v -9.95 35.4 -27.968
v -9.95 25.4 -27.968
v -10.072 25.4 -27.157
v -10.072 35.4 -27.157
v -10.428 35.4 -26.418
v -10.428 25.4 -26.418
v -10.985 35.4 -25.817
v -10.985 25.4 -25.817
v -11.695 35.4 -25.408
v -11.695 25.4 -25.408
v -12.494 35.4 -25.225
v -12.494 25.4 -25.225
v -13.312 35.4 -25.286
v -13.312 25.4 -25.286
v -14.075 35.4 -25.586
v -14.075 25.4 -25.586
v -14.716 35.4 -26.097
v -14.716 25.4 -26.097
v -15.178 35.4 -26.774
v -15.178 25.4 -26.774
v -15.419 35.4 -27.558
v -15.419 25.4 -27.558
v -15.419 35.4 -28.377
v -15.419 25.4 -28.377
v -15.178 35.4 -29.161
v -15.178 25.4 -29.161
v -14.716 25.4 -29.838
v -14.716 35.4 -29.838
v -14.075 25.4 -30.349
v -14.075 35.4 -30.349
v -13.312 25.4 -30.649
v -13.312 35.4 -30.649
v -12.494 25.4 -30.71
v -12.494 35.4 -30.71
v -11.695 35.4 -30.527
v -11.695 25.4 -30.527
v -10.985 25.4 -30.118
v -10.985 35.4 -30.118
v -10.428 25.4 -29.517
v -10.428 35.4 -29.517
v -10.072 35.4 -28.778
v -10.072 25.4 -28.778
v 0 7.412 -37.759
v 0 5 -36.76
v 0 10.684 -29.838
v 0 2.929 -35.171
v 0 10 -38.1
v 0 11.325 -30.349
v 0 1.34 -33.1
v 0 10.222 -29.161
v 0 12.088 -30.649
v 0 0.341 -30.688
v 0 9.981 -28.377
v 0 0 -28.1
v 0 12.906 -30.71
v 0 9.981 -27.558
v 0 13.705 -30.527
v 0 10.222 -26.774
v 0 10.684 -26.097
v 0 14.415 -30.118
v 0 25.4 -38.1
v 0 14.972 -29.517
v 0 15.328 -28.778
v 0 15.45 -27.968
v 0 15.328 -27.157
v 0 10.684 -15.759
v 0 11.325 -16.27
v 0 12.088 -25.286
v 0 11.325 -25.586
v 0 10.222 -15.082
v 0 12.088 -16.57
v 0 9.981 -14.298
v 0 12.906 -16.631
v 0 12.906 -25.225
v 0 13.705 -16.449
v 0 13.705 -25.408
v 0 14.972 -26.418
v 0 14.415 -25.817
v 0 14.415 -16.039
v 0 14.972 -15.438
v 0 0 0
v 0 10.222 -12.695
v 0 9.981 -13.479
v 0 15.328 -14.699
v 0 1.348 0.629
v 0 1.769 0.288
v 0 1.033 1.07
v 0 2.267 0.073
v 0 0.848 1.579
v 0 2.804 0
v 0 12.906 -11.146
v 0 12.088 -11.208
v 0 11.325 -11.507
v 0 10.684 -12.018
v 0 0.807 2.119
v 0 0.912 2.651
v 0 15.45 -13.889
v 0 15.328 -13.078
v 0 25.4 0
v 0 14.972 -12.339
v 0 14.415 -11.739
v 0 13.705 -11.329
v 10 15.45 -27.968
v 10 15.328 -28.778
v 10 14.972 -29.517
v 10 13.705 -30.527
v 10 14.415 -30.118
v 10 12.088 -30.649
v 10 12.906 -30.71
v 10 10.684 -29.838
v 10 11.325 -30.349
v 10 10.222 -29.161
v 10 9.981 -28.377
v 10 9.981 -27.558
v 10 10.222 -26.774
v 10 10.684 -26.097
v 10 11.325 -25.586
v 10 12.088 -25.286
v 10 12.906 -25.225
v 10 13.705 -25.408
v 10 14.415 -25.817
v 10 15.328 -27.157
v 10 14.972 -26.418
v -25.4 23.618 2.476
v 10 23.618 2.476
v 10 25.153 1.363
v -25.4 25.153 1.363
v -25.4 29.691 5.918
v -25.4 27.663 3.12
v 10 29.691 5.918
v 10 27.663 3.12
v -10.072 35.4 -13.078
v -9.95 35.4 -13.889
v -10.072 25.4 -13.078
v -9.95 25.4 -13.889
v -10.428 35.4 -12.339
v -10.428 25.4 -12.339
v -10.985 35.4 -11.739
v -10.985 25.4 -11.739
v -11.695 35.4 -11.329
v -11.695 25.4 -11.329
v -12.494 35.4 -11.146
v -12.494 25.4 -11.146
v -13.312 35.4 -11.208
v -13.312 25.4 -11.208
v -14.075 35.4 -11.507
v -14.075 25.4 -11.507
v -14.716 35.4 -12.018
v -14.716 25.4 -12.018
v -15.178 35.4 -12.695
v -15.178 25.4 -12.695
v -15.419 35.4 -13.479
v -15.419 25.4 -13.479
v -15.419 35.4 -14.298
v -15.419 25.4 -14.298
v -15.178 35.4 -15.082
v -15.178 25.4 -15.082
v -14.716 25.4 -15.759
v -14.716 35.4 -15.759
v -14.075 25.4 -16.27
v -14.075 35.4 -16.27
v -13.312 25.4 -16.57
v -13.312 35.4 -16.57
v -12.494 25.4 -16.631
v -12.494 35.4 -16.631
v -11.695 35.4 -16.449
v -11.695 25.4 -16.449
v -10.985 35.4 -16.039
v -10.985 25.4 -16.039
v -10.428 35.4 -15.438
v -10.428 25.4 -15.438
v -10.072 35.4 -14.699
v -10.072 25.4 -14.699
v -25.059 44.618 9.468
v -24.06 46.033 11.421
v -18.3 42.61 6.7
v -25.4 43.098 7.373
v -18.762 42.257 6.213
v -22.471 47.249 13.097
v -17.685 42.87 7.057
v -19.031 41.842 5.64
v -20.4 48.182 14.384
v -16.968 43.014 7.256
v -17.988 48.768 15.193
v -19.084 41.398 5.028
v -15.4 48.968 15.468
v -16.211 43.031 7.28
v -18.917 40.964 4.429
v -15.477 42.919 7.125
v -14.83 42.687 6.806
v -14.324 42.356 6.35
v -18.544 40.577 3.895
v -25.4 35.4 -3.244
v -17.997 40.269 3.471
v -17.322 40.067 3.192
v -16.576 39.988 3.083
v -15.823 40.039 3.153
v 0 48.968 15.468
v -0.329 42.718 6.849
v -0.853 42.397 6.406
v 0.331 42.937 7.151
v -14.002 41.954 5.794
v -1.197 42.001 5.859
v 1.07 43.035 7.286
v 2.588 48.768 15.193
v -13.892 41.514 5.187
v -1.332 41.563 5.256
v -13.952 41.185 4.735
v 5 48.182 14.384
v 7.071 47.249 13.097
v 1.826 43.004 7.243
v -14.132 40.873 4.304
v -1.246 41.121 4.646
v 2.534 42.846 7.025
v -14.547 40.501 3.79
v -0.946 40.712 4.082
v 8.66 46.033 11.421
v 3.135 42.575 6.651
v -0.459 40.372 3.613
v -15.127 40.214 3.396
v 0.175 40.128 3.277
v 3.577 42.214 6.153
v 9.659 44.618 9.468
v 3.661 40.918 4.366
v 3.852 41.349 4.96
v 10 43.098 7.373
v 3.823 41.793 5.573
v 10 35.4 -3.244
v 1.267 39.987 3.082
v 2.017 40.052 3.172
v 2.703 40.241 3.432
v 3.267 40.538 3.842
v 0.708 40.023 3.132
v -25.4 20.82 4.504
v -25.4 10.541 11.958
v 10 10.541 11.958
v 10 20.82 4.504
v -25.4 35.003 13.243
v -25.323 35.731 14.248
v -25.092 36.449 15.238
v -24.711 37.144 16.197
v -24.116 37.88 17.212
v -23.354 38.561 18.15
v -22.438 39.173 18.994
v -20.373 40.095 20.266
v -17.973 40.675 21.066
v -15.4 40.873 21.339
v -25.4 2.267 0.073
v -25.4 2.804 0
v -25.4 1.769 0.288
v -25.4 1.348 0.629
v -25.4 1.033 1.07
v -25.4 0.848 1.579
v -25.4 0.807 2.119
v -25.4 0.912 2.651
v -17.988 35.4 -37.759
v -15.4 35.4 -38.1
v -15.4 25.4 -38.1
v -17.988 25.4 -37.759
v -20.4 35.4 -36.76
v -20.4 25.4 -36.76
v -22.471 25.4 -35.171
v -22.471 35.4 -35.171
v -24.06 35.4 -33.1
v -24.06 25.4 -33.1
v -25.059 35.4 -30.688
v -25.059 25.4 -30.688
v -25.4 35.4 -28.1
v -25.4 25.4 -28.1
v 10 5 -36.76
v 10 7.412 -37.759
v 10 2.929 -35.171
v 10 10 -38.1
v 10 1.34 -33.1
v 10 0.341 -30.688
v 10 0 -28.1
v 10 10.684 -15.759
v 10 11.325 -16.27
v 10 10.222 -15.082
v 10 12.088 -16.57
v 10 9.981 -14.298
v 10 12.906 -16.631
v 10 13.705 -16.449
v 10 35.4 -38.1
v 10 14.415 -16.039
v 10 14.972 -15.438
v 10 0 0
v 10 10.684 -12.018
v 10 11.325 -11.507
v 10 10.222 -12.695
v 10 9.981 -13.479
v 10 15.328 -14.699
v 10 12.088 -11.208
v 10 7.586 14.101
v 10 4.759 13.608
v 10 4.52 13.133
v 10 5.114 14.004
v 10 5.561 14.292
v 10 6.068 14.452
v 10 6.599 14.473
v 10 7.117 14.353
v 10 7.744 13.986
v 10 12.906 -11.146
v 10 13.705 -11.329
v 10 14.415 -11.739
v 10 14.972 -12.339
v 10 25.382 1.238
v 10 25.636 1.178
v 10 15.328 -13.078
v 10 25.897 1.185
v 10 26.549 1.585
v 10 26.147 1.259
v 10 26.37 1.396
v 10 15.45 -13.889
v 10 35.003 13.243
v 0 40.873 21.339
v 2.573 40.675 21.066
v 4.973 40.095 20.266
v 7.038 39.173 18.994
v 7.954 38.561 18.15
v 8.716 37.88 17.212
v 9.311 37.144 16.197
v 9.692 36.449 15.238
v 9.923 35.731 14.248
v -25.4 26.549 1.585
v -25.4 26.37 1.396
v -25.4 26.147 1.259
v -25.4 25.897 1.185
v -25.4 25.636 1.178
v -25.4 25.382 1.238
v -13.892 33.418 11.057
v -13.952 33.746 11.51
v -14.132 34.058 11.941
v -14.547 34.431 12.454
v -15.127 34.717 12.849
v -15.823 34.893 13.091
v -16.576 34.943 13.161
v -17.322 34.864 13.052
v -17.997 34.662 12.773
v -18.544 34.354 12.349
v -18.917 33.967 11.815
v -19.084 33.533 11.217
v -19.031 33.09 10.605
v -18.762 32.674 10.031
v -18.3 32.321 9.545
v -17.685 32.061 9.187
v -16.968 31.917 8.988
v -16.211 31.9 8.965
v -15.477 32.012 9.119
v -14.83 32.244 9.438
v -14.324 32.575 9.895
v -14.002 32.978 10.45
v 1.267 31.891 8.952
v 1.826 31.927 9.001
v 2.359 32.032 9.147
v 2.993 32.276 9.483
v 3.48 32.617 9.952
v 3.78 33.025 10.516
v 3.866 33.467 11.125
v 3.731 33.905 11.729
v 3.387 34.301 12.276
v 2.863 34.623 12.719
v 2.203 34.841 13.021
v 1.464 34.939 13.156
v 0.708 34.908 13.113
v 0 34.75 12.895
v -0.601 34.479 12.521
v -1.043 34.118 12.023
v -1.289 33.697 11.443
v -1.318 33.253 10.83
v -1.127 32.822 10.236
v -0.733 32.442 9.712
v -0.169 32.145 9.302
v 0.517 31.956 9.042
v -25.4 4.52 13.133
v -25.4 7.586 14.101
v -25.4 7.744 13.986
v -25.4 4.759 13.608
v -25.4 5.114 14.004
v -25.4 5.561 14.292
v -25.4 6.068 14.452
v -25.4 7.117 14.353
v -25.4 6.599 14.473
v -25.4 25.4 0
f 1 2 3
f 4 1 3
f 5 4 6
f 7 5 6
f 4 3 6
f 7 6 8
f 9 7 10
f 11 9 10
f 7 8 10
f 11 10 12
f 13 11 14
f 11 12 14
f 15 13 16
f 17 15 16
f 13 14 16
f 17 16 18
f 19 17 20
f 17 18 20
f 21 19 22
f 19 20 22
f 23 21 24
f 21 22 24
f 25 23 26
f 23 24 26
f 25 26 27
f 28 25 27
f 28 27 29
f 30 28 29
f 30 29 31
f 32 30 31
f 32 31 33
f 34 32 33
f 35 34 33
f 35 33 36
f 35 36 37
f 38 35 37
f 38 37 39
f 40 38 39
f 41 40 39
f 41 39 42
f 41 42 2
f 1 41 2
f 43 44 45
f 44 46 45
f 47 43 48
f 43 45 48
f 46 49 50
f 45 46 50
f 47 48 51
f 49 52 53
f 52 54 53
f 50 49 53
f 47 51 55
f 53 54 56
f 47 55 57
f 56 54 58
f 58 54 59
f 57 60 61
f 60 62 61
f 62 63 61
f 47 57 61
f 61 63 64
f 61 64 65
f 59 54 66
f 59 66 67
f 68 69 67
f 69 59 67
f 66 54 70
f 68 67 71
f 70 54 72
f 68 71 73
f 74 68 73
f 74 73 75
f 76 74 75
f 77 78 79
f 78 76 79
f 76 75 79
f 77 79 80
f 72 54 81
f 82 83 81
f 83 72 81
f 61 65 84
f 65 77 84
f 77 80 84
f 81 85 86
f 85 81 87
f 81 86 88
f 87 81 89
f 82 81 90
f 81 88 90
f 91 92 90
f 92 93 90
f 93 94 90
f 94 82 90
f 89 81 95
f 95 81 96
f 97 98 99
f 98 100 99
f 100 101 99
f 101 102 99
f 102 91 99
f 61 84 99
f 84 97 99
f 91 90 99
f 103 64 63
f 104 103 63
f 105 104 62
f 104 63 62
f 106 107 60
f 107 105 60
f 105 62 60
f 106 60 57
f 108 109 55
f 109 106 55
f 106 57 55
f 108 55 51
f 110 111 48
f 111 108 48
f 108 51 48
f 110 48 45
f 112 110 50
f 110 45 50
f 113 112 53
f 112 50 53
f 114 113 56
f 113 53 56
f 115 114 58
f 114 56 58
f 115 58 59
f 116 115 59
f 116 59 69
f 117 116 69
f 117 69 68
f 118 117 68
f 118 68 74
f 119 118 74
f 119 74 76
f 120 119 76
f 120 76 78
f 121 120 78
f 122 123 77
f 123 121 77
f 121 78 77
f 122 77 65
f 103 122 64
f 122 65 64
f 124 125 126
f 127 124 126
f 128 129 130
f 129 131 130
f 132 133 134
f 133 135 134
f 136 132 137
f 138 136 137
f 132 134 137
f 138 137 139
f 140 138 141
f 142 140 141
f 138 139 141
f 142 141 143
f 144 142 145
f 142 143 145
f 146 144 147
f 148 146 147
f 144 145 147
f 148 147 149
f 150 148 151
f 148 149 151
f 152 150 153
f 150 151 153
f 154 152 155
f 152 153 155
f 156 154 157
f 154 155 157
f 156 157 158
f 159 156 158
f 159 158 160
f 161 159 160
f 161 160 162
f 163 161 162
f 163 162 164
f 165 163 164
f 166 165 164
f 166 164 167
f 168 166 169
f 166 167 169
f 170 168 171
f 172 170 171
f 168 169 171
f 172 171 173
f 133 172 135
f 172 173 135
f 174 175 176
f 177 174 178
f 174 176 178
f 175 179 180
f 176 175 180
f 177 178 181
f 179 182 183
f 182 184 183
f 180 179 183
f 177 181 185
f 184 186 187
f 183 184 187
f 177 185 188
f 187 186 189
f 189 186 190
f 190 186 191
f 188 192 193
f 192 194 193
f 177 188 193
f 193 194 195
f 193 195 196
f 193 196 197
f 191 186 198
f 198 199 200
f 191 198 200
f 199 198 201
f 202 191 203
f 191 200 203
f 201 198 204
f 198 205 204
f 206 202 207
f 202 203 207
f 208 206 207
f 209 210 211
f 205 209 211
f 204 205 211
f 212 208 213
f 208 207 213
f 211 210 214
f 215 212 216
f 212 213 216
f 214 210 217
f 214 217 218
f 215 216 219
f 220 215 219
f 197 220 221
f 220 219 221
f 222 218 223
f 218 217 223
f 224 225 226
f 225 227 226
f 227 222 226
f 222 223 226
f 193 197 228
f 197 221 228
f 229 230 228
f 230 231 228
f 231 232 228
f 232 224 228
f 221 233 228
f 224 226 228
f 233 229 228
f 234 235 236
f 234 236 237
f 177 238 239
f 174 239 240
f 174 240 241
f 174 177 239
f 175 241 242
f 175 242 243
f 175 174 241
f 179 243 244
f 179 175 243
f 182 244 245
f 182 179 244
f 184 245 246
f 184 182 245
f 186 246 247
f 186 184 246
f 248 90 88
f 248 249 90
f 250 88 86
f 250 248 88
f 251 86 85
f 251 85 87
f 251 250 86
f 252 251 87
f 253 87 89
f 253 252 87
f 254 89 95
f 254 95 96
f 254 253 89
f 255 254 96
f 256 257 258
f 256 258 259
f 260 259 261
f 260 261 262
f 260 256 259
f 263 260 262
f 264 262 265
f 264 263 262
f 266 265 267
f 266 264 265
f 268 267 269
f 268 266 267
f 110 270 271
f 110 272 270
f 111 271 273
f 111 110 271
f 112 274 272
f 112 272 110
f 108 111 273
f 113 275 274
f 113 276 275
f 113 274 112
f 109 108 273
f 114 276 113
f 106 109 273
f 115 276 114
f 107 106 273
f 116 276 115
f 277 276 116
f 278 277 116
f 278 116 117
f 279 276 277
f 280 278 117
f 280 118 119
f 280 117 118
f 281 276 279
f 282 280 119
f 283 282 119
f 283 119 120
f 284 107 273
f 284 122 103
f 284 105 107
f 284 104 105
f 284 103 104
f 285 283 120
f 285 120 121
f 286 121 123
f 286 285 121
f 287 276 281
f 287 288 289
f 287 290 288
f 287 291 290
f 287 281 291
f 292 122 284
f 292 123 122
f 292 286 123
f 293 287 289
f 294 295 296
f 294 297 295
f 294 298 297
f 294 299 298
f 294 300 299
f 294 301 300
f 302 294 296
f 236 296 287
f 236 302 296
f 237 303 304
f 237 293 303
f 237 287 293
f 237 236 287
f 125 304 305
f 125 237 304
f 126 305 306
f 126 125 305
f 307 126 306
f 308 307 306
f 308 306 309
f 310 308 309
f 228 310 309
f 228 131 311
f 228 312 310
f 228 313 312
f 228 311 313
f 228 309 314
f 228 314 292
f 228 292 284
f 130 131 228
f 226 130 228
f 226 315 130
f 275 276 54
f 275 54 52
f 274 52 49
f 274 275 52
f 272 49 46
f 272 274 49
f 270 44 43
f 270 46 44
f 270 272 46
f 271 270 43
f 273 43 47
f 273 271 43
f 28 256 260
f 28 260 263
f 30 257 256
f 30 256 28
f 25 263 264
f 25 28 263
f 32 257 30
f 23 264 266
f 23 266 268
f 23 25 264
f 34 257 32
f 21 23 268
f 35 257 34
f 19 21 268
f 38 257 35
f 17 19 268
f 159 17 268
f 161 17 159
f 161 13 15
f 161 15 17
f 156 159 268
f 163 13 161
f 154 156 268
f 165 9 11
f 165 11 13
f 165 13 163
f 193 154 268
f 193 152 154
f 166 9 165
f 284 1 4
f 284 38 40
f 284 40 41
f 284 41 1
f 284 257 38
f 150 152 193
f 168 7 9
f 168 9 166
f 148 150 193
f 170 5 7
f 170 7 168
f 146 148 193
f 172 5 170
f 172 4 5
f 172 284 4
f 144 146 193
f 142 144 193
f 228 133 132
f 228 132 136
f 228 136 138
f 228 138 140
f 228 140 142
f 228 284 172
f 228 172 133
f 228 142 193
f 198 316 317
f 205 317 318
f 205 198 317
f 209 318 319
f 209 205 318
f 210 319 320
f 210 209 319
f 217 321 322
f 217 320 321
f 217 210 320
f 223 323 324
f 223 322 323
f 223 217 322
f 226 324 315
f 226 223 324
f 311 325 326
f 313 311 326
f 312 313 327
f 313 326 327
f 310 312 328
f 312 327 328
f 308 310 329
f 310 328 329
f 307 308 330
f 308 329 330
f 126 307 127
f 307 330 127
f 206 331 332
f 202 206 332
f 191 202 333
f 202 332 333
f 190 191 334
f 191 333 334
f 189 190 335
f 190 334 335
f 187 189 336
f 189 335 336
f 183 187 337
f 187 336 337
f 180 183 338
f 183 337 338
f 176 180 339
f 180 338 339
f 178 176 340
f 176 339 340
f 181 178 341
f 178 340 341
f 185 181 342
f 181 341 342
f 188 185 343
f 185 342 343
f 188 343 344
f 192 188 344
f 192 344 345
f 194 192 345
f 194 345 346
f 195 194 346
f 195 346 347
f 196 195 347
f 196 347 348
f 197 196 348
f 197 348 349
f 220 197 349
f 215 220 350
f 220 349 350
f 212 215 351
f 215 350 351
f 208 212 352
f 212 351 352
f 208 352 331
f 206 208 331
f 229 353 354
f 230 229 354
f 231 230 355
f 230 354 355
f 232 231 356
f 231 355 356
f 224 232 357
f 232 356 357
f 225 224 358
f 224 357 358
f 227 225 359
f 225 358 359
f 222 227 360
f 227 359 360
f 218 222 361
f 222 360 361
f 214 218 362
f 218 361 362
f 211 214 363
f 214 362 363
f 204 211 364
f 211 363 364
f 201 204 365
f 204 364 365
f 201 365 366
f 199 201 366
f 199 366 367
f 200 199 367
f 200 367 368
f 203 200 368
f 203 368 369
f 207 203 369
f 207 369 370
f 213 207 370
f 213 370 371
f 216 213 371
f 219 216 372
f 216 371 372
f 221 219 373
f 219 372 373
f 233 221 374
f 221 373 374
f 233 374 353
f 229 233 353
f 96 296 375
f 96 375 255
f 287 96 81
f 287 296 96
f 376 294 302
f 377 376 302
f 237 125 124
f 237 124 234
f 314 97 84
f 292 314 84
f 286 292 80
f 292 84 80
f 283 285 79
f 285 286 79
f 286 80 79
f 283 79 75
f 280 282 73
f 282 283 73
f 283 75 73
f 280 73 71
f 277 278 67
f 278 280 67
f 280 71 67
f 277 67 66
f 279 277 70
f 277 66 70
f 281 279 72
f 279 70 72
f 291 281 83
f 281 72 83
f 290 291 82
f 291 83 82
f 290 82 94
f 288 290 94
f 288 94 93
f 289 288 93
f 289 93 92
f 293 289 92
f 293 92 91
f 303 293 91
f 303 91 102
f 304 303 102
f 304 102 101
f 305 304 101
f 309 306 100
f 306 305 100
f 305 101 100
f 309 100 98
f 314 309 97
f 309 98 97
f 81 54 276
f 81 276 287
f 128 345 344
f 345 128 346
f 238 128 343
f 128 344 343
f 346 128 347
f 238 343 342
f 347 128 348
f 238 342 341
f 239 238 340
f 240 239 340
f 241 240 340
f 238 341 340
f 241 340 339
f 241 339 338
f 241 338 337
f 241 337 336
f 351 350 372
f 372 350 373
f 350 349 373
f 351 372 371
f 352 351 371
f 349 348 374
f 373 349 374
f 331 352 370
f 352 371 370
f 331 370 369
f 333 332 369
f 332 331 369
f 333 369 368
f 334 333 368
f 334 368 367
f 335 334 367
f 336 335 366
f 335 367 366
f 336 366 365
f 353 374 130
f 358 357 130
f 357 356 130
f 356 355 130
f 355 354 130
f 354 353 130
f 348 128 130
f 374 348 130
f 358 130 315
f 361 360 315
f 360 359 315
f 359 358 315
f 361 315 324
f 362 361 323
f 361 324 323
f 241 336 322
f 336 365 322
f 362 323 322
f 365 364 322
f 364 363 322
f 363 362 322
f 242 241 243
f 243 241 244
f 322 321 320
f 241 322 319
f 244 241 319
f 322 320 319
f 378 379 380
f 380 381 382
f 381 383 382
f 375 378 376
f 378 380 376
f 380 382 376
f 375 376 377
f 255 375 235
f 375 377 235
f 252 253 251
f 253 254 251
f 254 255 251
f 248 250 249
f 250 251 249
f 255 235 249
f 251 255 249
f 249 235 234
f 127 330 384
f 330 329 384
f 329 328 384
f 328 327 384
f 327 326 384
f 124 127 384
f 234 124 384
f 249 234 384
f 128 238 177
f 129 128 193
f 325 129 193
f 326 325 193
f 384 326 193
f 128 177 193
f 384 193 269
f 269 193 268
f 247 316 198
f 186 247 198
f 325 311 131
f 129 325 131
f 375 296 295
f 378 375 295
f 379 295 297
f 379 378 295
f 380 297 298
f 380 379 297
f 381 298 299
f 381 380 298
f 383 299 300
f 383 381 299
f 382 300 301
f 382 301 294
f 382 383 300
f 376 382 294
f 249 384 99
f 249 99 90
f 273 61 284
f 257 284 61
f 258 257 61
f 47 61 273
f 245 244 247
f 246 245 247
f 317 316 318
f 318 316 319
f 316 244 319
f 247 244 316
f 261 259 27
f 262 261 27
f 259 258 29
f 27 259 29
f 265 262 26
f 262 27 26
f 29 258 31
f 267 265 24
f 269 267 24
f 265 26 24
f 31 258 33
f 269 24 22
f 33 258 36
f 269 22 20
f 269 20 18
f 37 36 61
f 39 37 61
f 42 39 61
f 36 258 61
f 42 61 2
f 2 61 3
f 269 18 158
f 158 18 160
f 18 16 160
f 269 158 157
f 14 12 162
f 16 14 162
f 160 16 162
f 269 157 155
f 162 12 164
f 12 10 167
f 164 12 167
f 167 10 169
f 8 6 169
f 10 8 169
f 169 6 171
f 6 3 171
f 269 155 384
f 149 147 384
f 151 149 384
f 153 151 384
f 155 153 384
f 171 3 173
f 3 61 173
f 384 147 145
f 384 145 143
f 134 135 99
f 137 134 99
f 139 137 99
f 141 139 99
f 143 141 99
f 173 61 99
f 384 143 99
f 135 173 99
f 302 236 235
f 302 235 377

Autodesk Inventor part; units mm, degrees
ref_plane "YZ Plane" through (0, 0, 0) normal (1, 0, 0) x (0, 1, 0)
ref_plane "XZ Plane" through (0, 0, 0) normal (0, 1, 0) x (-1, 0, 0)
ref_plane "XY Plane" through (0, 0, 0) normal (0, 0, 1) x (1, 0, 0)
sketch "Sketch1" plane through (0, 0, 0) normal (1, 0, 0) x (0, 1, 0)
  line L0 (0, 0) -> (25.4, 0)
  line L1 (25.4, 0) -> (25.4, -38.1)
  line L2 (25.4, -38.1) -> (0, -38.1)
  line L3 (0, -38.1) -> (0, 0)
  circle A0 centre (12.7, -27.9675) radius 2.75
  circle A1 centre (12.7, -13.8886) radius 2.75
  dimension "d0" = 25.4
  dimension "d1" = 38.1
  dimension "d2" = 5.5
extrude "Extrusion1" add sketch "Sketch1" along normal blind 10
sketch "Sketch2" plane through (10, 0, 0) normal (1, 0, 0) x (0, 0, -1)
  line L0 (-11.9576, 10.5414) -> (-13.9859, 7.7441) projected
  line L1 (-2.4758, 23.6177) -> (-4.5041, 20.8204) projected
  line L2 (-18.0308, 7.0996) -> (-20.828, 9.1279) projected
  line L3 (-31.1071, 16.5813) -> (-33.9043, 18.6096) projected
  line L4 (-34.5489, 22.6546) -> (-32.5206, 25.4518) projected
  line L5 (-25.0672, 35.7309) -> (-23.0389, 38.5281) projected
  line L6 (-3.1204, 27.6626) -> (-5.9176, 29.6909) projected
  line L7 (-16.1967, 37.1443) -> (-18.9939, 39.1726) projected
  line L8 (38.1, 0) -> (38.1, 25.4) projected
  line L9 (38.1, 25.4) -> (0, 25.4) projected
  line L10 (0, 25.4) -> (0, 0) projected
  line L11 (0, 0) -> (38.1, 0) projected
  circle A0 centre (13.8886, 12.7) radius 2.75 projected
  circle A1 centre (27.9675, 12.7) radius 2.75 projected
  line L12 (-0.7756, 25.9624) -> (-21.3387, 40.8728)
  line L13 (-0.7756, 25.9624) -> (0, 25.4)
  line L14 (-15.6861, 5.3994) -> (-0.7756, 25.9624)
  line L15 (-15.6861, 5.3994) -> (0, 0)
  line L16 (-15.6861, 5.3994) -> (-36.2491, 20.3098)
  line L17 (-21.3387, 40.8728) -> (-15.4684, 48.9685)
  line L18 (-15.4684, 48.9685) -> (17.7637, 24.8716)
  line L19 (17.7637, 24.8716) -> (11.8935, 16.7759)
  line L20 (11.8935, 16.7759) -> (-21.3387, 40.8728)
  line L21 (-15.6861, 5.3994) -> (-36.2491, 20.3098)
  line L22 (38.1, 0) -> (0, 0)
  line L23 (38.1, 25.4) -> (38.1, 35.4)
  line L24 (38.1, 35.4) -> (1.1477, 35.4)
  line L25 (1.1477, 35.4) -> (1.1477, 25.4)
  line L26 (1.1477, 25.4) -> (38.1, 25.4)
  point P0 (17.035, 25.4)
  point P1 (3.244, 35.4)
  dimension "d5" = 10
  dimension "d10" = 10
extrude "Extrusion2" add sketch "Sketch2" against normal blind 35.4 contours L14 L1 L13 L10 L15 L0 | L12 L6 L7 L17 L18 L24 L25 L9 L13 | L25 L24 L18 L9 | L9 L18 L24 L23
sketch "Sketch3" plane through (0, 25.4, -38.1) normal (0, -1, 0) x (1, 0, 0)
  line L0 (0, 0) -> (0, 38.1) projected
  line L1 (0, 38.1) -> (-25.4, 38.1) projected
  line L2 (-25.4, 0) -> (-25.4, 38.1) projected
  line L3 (0, 0) -> (-25.4, 0) projected
  line L4 (10, 12.8825) -> (10, 7.3825) projected
  line L5 (0, 12.8825) -> (0, 7.3825) projected
  line L6 (10, 26.9614) -> (10, 21.4614) projected
  circle A0 centre (-12.7, 10.1325) radius 2.75
  circle A1 centre (-12.7, 24.2114) radius 2.75
  point P0 (0, 38.1)
extrude "Extrusion3" cut sketch "Sketch3" against normal blind 35.4 contours A0 | A1
sketch "Sketch4" plane through (-25.4, 40.8728, 21.3387) normal (0, -0.8096, 0.587) x (1, 0, 0)
  line L0 (35.4, 0) -> (35.4, -25.4) projected
  line L1 (35.4, 0) -> (0, 0) projected
  line L2 (0, -25.4) -> (0, 0) projected
  line L3 (35.4, -25.4) -> (0, -25.4) projected
  line L4 (26.667, -12.7) -> (8.9084, -12.7) construction
  line L5 (26.667, -10.1) -> (8.9084, -10.1)
  line L6 (8.9084, -15.3) -> (26.667, -15.3)
  arc A0 (26.667, -15.3) -> (26.667, -10.1) centre (26.667, -12.7) ccw
  arc A1 (8.9084, -10.1) -> (8.9084, -15.3) centre (8.9084, -12.7) ccw
  circle A2 centre (26.667, -12.7) radius 2.6
  circle A3 centre (8.9084, -12.7) radius 2.6
  point P0 (25.4, -41.2685)
  point P1 (17.7877, -12.7)
  point P2 (8.9084, -10.1)
  point P3 (26.667, -10.1)
  dimension "d13" = 2.6
extrude "Extrusion4" cut sketch "Sketch4" against normal blind 35.4 contours A0 A2 | A3 A1
fillet "Fillet1" radius 10 4 edges at (5, 0, -38.1) (-25.4, 30.4, -38.1) (10, 44.9207, 18.4035) (-25.4, 44.9207, 18.4035)
fillet "Fillet2" radius 2 2 edges at (-12.7, 0, 0) (-7.7, 5.3994, 15.6861)
fillet "Fillet3" radius 1 1 edges at (-7.7, 25.9624, 0.7756)
properties part number "upperRearBracket"
